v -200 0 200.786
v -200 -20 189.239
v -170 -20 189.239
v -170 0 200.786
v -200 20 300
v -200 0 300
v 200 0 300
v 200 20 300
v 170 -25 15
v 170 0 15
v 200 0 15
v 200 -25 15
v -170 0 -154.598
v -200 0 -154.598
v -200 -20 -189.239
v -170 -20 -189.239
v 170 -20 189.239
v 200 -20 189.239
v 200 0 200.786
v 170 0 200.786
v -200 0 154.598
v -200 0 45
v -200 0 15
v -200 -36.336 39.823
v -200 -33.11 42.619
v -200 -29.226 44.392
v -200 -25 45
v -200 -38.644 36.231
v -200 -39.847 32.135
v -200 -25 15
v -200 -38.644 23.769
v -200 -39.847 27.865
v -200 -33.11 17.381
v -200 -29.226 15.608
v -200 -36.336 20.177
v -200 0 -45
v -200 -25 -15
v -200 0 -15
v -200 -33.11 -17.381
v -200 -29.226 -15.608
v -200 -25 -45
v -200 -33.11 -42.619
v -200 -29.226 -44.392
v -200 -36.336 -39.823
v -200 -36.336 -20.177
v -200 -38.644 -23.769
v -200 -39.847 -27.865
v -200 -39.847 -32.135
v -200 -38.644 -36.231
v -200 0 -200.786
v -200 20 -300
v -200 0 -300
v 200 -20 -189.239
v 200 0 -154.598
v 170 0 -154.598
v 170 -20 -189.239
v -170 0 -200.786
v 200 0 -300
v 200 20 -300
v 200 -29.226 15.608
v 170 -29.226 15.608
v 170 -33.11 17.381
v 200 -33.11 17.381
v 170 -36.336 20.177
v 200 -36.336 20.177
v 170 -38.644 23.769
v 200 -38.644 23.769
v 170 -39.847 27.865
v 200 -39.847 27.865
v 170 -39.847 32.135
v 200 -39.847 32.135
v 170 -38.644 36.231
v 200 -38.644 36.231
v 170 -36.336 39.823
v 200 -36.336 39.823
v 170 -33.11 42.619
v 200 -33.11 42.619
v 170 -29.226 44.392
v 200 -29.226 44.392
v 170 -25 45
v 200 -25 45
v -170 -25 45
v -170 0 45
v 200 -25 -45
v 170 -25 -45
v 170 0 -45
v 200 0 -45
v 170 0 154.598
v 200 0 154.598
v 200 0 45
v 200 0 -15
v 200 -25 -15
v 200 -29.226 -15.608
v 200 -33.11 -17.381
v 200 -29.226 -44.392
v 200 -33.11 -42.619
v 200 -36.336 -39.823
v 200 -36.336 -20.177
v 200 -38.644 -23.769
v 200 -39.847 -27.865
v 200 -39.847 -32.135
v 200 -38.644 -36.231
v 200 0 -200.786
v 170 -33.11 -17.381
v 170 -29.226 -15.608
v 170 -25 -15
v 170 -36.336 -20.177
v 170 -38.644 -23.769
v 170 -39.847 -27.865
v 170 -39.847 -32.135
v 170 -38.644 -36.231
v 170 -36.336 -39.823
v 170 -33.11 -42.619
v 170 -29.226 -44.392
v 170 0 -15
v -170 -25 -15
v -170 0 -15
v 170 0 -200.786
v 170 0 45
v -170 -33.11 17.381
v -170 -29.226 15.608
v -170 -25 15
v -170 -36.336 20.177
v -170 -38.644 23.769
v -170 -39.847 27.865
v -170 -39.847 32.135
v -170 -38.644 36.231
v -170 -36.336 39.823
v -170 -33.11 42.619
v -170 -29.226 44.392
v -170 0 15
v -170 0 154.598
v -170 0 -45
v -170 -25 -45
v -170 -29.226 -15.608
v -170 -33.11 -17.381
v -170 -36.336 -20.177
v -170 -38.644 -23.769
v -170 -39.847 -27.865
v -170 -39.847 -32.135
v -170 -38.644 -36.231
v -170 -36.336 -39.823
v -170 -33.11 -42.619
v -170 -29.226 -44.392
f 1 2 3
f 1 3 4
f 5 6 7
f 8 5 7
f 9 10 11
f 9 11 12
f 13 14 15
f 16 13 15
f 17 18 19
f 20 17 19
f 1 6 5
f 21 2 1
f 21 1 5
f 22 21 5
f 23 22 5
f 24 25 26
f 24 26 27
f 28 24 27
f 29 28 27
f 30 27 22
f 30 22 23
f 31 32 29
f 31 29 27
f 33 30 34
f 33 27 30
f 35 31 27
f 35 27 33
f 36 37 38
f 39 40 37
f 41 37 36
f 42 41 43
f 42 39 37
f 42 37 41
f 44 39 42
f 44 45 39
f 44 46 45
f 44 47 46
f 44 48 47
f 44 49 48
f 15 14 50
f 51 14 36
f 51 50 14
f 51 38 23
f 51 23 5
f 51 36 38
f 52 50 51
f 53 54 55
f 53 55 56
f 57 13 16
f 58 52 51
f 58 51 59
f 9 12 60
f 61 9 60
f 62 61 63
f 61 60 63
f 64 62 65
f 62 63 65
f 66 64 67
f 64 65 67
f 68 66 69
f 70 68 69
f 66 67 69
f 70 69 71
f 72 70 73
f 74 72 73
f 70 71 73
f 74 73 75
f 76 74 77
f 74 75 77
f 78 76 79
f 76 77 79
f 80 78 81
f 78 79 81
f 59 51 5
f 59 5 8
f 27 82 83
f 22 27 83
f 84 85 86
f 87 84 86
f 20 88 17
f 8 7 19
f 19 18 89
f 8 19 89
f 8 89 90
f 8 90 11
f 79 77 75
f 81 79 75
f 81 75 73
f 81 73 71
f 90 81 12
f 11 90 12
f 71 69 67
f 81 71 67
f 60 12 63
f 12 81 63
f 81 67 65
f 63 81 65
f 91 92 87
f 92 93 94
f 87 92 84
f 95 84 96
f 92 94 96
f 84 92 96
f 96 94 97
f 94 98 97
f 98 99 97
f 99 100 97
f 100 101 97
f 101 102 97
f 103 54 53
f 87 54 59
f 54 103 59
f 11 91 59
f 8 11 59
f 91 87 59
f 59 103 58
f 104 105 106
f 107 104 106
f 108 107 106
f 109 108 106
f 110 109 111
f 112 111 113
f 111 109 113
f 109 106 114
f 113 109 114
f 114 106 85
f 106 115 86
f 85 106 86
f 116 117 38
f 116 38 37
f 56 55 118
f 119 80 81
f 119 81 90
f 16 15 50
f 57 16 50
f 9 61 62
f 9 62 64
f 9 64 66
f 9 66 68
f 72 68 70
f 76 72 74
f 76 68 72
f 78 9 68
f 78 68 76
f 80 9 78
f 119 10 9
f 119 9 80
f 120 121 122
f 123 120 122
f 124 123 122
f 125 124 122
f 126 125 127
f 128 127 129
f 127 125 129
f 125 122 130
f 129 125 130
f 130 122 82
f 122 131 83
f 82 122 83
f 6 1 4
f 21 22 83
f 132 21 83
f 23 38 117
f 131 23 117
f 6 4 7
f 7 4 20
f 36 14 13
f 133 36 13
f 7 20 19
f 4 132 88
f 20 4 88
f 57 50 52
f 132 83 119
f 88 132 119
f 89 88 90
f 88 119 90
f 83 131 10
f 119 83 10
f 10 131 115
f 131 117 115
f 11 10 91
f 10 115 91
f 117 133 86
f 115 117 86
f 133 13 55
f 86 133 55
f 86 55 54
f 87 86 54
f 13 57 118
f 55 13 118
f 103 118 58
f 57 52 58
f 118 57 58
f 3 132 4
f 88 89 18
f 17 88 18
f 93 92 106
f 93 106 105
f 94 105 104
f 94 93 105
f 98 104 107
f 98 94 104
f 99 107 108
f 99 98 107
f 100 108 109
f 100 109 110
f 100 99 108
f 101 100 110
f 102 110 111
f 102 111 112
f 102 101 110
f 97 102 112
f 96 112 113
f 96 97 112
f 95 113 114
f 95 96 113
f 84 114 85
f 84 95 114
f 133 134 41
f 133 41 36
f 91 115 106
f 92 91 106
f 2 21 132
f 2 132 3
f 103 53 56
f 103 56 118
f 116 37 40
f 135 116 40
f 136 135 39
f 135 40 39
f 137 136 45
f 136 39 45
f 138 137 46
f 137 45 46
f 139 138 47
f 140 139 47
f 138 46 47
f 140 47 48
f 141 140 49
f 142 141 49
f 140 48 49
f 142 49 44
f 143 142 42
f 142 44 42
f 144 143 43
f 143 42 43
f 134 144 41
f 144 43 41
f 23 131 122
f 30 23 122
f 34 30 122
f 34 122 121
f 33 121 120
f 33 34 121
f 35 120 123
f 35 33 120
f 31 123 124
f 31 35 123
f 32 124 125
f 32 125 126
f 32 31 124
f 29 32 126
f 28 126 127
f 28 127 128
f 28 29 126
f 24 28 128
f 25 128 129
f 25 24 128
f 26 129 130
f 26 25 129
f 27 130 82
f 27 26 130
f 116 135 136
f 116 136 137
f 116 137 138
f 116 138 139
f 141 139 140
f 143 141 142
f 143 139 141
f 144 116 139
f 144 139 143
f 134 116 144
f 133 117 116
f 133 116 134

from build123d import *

# Parameters (mm, degrees)
SKETCH1_W            = 400
SKETCH1_H            = 600
BOSS_EXTRUDE1_DEPTH  = 20
BOSS_EXTRUDE2_DEPTH  = 30
MIRROR2_COPY_1_DEPTH = 30
BOSS_EXTRUDE3_DEPTH  = 30
MIRROR4_COPY_1_DEPTH = 30


with BuildPart() as part:
    # Sketch1 → Boss-Extrude1 (new body)
    with BuildSketch(Plane(origin=(0, 0, 0), x_dir=(1, 0, 0), z_dir=(0, 1, 0))):
        Rectangle(SKETCH1_W, SKETCH1_H)
    extrude(amount=BOSS_EXTRUDE1_DEPTH)

    # Sketch3 → Boss-Extrude2 (add)
    with BuildSketch(Plane(origin=(200, 0, 0), x_dir=(0, 0, -1), z_dir=(1, 0, 0))):
        with BuildLine():
            Line((-45, -25), (-45, 0))
            Line((-45, 0), (-15, 0))
            Line((-15, 0), (-15, -25))
            ThreePointArc((-15, -25), (-30, -40), (-45, -25))
        make_face()
    boss_extrude2 = extrude(amount=-BOSS_EXTRUDE2_DEPTH)

    # Mirror1: Boss-Extrude2 across plane
    add(boss_extrude2.mirror(Plane.XY))

    # Mirror2: Boss-Extrude2 across plane
    add(boss_extrude2.mirror(Plane(origin=(0, 0, 0), x_dir=(0, 0, 1), z_dir=(1, 0, 0))))

    # Mirror2 copy 1 sketch → Mirror2 copy 1 (add)
    with BuildSketch(Plane.ZY.offset(200)):
        with BuildLine():
            Line((-45, -25), (-45, 0))
            Line((-45, 0), (-15, 0))
            Line((-15, 0), (-15, -25))
            ThreePointArc((-15, -25), (-30, -40), (-45, -25))
        make_face()
    extrude(amount=-MIRROR2_COPY_1_DEPTH)

    # Sketch4 → Boss-Extrude3 (add)
    with BuildSketch(Plane(origin=(200, 0, 0), x_dir=(0, 0, -1), z_dir=(1, 0, 0))):
        Polygon((-154.598033597, 0), (-189.239049749, -20), (-200.786055132, 0), align=None)
    boss_extrude3 = extrude(amount=-BOSS_EXTRUDE3_DEPTH)

    # Mirror3: Boss-Extrude3 across plane
    add(boss_extrude3.mirror(Plane(origin=(0, 0, 0), x_dir=(0, 0, 1), z_dir=(1, 0, 0))))

    # Mirror4: Boss-Extrude3 across plane
    add(boss_extrude3.mirror(Plane.XY))

    # Mirror4 copy 1 sketch → Mirror4 copy 1 (add)
    with BuildSketch(Plane.ZY.offset(200)):
        Polygon((-154.598033597, 0), (-189.239049749, -20), (-200.786055132, 0), align=None)
    extrude(amount=-MIRROR4_COPY_1_DEPTH)


solid = part.part
